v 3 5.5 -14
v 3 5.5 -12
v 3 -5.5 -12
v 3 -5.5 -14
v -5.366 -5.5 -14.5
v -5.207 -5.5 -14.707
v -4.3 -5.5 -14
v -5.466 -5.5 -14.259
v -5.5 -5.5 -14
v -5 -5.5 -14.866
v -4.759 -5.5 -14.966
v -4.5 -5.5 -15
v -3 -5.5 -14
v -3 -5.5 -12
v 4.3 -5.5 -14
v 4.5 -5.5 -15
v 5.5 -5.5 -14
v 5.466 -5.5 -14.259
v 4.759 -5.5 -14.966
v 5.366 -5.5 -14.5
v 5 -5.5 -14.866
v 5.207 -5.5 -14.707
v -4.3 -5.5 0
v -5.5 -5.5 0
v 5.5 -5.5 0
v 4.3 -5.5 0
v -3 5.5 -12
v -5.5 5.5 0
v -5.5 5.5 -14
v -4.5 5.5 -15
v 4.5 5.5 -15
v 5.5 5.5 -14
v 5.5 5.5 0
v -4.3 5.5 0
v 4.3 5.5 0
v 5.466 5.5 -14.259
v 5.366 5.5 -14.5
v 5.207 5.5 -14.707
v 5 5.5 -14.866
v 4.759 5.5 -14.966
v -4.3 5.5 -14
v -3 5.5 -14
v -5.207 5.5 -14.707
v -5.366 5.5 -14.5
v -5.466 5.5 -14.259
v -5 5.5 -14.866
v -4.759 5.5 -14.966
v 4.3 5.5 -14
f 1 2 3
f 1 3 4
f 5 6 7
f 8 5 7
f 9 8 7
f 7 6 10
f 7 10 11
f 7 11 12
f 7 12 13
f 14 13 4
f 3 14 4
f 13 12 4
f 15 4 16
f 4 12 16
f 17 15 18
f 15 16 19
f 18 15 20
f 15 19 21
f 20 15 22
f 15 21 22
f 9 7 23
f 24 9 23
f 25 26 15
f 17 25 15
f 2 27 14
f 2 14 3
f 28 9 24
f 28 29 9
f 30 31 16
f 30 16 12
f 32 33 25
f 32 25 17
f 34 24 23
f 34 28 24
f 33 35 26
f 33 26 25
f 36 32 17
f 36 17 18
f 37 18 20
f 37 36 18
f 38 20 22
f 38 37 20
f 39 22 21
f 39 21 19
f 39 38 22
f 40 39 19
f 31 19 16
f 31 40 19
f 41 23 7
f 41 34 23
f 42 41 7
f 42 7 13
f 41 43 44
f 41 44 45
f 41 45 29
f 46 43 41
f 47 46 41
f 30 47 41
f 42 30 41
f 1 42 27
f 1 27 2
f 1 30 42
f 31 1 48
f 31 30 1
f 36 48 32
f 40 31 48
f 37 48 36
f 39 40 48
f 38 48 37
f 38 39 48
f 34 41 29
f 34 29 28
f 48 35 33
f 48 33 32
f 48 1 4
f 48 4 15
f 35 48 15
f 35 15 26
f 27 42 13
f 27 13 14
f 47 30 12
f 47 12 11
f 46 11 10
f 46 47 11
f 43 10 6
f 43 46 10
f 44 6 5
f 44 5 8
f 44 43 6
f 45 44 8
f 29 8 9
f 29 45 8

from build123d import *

# Parameters (mm, degrees)
PAD_DEPTH = 5.5


with BuildPart() as part:
    # Sketch (on Sketch) → Pad (new body, symmetric)
    with BuildSketch(Plane(origin=(0, 0, 0), x_dir=(1, 0, 0), z_dir=(0, 1, 0))):
        with BuildLine():
            Line((-4.3, 0), (-4.3, 14))
            Line((-4.3, 14), (-3, 14))
            Line((-3, 14), (-3, 12))
            Line((-3, 12), (3, 12))
            Line((3, 12), (3, 14))
            Line((3, 14), (4.3, 14))
            Line((4.3, 14), (4.3, 0))
            Line((4.3, 0), (5.5, 0))
            Line((5.5, 0), (5.5, 14))
            ThreePointArc((5.5, 14), (5.207107, 14.707107), (4.5, 15))
            Line((4.5, 15), (-4.5, 15))
            ThreePointArc((-4.5, 15), (-5.207107, 14.707107), (-5.5, 14))
            Line((-5.5, 14), (-5.5, 0))
            Line((-5.5, 0), (-4.3, 0))
        make_face()
    extrude(amount=PAD_DEPTH, both=True)


solid = part.part
